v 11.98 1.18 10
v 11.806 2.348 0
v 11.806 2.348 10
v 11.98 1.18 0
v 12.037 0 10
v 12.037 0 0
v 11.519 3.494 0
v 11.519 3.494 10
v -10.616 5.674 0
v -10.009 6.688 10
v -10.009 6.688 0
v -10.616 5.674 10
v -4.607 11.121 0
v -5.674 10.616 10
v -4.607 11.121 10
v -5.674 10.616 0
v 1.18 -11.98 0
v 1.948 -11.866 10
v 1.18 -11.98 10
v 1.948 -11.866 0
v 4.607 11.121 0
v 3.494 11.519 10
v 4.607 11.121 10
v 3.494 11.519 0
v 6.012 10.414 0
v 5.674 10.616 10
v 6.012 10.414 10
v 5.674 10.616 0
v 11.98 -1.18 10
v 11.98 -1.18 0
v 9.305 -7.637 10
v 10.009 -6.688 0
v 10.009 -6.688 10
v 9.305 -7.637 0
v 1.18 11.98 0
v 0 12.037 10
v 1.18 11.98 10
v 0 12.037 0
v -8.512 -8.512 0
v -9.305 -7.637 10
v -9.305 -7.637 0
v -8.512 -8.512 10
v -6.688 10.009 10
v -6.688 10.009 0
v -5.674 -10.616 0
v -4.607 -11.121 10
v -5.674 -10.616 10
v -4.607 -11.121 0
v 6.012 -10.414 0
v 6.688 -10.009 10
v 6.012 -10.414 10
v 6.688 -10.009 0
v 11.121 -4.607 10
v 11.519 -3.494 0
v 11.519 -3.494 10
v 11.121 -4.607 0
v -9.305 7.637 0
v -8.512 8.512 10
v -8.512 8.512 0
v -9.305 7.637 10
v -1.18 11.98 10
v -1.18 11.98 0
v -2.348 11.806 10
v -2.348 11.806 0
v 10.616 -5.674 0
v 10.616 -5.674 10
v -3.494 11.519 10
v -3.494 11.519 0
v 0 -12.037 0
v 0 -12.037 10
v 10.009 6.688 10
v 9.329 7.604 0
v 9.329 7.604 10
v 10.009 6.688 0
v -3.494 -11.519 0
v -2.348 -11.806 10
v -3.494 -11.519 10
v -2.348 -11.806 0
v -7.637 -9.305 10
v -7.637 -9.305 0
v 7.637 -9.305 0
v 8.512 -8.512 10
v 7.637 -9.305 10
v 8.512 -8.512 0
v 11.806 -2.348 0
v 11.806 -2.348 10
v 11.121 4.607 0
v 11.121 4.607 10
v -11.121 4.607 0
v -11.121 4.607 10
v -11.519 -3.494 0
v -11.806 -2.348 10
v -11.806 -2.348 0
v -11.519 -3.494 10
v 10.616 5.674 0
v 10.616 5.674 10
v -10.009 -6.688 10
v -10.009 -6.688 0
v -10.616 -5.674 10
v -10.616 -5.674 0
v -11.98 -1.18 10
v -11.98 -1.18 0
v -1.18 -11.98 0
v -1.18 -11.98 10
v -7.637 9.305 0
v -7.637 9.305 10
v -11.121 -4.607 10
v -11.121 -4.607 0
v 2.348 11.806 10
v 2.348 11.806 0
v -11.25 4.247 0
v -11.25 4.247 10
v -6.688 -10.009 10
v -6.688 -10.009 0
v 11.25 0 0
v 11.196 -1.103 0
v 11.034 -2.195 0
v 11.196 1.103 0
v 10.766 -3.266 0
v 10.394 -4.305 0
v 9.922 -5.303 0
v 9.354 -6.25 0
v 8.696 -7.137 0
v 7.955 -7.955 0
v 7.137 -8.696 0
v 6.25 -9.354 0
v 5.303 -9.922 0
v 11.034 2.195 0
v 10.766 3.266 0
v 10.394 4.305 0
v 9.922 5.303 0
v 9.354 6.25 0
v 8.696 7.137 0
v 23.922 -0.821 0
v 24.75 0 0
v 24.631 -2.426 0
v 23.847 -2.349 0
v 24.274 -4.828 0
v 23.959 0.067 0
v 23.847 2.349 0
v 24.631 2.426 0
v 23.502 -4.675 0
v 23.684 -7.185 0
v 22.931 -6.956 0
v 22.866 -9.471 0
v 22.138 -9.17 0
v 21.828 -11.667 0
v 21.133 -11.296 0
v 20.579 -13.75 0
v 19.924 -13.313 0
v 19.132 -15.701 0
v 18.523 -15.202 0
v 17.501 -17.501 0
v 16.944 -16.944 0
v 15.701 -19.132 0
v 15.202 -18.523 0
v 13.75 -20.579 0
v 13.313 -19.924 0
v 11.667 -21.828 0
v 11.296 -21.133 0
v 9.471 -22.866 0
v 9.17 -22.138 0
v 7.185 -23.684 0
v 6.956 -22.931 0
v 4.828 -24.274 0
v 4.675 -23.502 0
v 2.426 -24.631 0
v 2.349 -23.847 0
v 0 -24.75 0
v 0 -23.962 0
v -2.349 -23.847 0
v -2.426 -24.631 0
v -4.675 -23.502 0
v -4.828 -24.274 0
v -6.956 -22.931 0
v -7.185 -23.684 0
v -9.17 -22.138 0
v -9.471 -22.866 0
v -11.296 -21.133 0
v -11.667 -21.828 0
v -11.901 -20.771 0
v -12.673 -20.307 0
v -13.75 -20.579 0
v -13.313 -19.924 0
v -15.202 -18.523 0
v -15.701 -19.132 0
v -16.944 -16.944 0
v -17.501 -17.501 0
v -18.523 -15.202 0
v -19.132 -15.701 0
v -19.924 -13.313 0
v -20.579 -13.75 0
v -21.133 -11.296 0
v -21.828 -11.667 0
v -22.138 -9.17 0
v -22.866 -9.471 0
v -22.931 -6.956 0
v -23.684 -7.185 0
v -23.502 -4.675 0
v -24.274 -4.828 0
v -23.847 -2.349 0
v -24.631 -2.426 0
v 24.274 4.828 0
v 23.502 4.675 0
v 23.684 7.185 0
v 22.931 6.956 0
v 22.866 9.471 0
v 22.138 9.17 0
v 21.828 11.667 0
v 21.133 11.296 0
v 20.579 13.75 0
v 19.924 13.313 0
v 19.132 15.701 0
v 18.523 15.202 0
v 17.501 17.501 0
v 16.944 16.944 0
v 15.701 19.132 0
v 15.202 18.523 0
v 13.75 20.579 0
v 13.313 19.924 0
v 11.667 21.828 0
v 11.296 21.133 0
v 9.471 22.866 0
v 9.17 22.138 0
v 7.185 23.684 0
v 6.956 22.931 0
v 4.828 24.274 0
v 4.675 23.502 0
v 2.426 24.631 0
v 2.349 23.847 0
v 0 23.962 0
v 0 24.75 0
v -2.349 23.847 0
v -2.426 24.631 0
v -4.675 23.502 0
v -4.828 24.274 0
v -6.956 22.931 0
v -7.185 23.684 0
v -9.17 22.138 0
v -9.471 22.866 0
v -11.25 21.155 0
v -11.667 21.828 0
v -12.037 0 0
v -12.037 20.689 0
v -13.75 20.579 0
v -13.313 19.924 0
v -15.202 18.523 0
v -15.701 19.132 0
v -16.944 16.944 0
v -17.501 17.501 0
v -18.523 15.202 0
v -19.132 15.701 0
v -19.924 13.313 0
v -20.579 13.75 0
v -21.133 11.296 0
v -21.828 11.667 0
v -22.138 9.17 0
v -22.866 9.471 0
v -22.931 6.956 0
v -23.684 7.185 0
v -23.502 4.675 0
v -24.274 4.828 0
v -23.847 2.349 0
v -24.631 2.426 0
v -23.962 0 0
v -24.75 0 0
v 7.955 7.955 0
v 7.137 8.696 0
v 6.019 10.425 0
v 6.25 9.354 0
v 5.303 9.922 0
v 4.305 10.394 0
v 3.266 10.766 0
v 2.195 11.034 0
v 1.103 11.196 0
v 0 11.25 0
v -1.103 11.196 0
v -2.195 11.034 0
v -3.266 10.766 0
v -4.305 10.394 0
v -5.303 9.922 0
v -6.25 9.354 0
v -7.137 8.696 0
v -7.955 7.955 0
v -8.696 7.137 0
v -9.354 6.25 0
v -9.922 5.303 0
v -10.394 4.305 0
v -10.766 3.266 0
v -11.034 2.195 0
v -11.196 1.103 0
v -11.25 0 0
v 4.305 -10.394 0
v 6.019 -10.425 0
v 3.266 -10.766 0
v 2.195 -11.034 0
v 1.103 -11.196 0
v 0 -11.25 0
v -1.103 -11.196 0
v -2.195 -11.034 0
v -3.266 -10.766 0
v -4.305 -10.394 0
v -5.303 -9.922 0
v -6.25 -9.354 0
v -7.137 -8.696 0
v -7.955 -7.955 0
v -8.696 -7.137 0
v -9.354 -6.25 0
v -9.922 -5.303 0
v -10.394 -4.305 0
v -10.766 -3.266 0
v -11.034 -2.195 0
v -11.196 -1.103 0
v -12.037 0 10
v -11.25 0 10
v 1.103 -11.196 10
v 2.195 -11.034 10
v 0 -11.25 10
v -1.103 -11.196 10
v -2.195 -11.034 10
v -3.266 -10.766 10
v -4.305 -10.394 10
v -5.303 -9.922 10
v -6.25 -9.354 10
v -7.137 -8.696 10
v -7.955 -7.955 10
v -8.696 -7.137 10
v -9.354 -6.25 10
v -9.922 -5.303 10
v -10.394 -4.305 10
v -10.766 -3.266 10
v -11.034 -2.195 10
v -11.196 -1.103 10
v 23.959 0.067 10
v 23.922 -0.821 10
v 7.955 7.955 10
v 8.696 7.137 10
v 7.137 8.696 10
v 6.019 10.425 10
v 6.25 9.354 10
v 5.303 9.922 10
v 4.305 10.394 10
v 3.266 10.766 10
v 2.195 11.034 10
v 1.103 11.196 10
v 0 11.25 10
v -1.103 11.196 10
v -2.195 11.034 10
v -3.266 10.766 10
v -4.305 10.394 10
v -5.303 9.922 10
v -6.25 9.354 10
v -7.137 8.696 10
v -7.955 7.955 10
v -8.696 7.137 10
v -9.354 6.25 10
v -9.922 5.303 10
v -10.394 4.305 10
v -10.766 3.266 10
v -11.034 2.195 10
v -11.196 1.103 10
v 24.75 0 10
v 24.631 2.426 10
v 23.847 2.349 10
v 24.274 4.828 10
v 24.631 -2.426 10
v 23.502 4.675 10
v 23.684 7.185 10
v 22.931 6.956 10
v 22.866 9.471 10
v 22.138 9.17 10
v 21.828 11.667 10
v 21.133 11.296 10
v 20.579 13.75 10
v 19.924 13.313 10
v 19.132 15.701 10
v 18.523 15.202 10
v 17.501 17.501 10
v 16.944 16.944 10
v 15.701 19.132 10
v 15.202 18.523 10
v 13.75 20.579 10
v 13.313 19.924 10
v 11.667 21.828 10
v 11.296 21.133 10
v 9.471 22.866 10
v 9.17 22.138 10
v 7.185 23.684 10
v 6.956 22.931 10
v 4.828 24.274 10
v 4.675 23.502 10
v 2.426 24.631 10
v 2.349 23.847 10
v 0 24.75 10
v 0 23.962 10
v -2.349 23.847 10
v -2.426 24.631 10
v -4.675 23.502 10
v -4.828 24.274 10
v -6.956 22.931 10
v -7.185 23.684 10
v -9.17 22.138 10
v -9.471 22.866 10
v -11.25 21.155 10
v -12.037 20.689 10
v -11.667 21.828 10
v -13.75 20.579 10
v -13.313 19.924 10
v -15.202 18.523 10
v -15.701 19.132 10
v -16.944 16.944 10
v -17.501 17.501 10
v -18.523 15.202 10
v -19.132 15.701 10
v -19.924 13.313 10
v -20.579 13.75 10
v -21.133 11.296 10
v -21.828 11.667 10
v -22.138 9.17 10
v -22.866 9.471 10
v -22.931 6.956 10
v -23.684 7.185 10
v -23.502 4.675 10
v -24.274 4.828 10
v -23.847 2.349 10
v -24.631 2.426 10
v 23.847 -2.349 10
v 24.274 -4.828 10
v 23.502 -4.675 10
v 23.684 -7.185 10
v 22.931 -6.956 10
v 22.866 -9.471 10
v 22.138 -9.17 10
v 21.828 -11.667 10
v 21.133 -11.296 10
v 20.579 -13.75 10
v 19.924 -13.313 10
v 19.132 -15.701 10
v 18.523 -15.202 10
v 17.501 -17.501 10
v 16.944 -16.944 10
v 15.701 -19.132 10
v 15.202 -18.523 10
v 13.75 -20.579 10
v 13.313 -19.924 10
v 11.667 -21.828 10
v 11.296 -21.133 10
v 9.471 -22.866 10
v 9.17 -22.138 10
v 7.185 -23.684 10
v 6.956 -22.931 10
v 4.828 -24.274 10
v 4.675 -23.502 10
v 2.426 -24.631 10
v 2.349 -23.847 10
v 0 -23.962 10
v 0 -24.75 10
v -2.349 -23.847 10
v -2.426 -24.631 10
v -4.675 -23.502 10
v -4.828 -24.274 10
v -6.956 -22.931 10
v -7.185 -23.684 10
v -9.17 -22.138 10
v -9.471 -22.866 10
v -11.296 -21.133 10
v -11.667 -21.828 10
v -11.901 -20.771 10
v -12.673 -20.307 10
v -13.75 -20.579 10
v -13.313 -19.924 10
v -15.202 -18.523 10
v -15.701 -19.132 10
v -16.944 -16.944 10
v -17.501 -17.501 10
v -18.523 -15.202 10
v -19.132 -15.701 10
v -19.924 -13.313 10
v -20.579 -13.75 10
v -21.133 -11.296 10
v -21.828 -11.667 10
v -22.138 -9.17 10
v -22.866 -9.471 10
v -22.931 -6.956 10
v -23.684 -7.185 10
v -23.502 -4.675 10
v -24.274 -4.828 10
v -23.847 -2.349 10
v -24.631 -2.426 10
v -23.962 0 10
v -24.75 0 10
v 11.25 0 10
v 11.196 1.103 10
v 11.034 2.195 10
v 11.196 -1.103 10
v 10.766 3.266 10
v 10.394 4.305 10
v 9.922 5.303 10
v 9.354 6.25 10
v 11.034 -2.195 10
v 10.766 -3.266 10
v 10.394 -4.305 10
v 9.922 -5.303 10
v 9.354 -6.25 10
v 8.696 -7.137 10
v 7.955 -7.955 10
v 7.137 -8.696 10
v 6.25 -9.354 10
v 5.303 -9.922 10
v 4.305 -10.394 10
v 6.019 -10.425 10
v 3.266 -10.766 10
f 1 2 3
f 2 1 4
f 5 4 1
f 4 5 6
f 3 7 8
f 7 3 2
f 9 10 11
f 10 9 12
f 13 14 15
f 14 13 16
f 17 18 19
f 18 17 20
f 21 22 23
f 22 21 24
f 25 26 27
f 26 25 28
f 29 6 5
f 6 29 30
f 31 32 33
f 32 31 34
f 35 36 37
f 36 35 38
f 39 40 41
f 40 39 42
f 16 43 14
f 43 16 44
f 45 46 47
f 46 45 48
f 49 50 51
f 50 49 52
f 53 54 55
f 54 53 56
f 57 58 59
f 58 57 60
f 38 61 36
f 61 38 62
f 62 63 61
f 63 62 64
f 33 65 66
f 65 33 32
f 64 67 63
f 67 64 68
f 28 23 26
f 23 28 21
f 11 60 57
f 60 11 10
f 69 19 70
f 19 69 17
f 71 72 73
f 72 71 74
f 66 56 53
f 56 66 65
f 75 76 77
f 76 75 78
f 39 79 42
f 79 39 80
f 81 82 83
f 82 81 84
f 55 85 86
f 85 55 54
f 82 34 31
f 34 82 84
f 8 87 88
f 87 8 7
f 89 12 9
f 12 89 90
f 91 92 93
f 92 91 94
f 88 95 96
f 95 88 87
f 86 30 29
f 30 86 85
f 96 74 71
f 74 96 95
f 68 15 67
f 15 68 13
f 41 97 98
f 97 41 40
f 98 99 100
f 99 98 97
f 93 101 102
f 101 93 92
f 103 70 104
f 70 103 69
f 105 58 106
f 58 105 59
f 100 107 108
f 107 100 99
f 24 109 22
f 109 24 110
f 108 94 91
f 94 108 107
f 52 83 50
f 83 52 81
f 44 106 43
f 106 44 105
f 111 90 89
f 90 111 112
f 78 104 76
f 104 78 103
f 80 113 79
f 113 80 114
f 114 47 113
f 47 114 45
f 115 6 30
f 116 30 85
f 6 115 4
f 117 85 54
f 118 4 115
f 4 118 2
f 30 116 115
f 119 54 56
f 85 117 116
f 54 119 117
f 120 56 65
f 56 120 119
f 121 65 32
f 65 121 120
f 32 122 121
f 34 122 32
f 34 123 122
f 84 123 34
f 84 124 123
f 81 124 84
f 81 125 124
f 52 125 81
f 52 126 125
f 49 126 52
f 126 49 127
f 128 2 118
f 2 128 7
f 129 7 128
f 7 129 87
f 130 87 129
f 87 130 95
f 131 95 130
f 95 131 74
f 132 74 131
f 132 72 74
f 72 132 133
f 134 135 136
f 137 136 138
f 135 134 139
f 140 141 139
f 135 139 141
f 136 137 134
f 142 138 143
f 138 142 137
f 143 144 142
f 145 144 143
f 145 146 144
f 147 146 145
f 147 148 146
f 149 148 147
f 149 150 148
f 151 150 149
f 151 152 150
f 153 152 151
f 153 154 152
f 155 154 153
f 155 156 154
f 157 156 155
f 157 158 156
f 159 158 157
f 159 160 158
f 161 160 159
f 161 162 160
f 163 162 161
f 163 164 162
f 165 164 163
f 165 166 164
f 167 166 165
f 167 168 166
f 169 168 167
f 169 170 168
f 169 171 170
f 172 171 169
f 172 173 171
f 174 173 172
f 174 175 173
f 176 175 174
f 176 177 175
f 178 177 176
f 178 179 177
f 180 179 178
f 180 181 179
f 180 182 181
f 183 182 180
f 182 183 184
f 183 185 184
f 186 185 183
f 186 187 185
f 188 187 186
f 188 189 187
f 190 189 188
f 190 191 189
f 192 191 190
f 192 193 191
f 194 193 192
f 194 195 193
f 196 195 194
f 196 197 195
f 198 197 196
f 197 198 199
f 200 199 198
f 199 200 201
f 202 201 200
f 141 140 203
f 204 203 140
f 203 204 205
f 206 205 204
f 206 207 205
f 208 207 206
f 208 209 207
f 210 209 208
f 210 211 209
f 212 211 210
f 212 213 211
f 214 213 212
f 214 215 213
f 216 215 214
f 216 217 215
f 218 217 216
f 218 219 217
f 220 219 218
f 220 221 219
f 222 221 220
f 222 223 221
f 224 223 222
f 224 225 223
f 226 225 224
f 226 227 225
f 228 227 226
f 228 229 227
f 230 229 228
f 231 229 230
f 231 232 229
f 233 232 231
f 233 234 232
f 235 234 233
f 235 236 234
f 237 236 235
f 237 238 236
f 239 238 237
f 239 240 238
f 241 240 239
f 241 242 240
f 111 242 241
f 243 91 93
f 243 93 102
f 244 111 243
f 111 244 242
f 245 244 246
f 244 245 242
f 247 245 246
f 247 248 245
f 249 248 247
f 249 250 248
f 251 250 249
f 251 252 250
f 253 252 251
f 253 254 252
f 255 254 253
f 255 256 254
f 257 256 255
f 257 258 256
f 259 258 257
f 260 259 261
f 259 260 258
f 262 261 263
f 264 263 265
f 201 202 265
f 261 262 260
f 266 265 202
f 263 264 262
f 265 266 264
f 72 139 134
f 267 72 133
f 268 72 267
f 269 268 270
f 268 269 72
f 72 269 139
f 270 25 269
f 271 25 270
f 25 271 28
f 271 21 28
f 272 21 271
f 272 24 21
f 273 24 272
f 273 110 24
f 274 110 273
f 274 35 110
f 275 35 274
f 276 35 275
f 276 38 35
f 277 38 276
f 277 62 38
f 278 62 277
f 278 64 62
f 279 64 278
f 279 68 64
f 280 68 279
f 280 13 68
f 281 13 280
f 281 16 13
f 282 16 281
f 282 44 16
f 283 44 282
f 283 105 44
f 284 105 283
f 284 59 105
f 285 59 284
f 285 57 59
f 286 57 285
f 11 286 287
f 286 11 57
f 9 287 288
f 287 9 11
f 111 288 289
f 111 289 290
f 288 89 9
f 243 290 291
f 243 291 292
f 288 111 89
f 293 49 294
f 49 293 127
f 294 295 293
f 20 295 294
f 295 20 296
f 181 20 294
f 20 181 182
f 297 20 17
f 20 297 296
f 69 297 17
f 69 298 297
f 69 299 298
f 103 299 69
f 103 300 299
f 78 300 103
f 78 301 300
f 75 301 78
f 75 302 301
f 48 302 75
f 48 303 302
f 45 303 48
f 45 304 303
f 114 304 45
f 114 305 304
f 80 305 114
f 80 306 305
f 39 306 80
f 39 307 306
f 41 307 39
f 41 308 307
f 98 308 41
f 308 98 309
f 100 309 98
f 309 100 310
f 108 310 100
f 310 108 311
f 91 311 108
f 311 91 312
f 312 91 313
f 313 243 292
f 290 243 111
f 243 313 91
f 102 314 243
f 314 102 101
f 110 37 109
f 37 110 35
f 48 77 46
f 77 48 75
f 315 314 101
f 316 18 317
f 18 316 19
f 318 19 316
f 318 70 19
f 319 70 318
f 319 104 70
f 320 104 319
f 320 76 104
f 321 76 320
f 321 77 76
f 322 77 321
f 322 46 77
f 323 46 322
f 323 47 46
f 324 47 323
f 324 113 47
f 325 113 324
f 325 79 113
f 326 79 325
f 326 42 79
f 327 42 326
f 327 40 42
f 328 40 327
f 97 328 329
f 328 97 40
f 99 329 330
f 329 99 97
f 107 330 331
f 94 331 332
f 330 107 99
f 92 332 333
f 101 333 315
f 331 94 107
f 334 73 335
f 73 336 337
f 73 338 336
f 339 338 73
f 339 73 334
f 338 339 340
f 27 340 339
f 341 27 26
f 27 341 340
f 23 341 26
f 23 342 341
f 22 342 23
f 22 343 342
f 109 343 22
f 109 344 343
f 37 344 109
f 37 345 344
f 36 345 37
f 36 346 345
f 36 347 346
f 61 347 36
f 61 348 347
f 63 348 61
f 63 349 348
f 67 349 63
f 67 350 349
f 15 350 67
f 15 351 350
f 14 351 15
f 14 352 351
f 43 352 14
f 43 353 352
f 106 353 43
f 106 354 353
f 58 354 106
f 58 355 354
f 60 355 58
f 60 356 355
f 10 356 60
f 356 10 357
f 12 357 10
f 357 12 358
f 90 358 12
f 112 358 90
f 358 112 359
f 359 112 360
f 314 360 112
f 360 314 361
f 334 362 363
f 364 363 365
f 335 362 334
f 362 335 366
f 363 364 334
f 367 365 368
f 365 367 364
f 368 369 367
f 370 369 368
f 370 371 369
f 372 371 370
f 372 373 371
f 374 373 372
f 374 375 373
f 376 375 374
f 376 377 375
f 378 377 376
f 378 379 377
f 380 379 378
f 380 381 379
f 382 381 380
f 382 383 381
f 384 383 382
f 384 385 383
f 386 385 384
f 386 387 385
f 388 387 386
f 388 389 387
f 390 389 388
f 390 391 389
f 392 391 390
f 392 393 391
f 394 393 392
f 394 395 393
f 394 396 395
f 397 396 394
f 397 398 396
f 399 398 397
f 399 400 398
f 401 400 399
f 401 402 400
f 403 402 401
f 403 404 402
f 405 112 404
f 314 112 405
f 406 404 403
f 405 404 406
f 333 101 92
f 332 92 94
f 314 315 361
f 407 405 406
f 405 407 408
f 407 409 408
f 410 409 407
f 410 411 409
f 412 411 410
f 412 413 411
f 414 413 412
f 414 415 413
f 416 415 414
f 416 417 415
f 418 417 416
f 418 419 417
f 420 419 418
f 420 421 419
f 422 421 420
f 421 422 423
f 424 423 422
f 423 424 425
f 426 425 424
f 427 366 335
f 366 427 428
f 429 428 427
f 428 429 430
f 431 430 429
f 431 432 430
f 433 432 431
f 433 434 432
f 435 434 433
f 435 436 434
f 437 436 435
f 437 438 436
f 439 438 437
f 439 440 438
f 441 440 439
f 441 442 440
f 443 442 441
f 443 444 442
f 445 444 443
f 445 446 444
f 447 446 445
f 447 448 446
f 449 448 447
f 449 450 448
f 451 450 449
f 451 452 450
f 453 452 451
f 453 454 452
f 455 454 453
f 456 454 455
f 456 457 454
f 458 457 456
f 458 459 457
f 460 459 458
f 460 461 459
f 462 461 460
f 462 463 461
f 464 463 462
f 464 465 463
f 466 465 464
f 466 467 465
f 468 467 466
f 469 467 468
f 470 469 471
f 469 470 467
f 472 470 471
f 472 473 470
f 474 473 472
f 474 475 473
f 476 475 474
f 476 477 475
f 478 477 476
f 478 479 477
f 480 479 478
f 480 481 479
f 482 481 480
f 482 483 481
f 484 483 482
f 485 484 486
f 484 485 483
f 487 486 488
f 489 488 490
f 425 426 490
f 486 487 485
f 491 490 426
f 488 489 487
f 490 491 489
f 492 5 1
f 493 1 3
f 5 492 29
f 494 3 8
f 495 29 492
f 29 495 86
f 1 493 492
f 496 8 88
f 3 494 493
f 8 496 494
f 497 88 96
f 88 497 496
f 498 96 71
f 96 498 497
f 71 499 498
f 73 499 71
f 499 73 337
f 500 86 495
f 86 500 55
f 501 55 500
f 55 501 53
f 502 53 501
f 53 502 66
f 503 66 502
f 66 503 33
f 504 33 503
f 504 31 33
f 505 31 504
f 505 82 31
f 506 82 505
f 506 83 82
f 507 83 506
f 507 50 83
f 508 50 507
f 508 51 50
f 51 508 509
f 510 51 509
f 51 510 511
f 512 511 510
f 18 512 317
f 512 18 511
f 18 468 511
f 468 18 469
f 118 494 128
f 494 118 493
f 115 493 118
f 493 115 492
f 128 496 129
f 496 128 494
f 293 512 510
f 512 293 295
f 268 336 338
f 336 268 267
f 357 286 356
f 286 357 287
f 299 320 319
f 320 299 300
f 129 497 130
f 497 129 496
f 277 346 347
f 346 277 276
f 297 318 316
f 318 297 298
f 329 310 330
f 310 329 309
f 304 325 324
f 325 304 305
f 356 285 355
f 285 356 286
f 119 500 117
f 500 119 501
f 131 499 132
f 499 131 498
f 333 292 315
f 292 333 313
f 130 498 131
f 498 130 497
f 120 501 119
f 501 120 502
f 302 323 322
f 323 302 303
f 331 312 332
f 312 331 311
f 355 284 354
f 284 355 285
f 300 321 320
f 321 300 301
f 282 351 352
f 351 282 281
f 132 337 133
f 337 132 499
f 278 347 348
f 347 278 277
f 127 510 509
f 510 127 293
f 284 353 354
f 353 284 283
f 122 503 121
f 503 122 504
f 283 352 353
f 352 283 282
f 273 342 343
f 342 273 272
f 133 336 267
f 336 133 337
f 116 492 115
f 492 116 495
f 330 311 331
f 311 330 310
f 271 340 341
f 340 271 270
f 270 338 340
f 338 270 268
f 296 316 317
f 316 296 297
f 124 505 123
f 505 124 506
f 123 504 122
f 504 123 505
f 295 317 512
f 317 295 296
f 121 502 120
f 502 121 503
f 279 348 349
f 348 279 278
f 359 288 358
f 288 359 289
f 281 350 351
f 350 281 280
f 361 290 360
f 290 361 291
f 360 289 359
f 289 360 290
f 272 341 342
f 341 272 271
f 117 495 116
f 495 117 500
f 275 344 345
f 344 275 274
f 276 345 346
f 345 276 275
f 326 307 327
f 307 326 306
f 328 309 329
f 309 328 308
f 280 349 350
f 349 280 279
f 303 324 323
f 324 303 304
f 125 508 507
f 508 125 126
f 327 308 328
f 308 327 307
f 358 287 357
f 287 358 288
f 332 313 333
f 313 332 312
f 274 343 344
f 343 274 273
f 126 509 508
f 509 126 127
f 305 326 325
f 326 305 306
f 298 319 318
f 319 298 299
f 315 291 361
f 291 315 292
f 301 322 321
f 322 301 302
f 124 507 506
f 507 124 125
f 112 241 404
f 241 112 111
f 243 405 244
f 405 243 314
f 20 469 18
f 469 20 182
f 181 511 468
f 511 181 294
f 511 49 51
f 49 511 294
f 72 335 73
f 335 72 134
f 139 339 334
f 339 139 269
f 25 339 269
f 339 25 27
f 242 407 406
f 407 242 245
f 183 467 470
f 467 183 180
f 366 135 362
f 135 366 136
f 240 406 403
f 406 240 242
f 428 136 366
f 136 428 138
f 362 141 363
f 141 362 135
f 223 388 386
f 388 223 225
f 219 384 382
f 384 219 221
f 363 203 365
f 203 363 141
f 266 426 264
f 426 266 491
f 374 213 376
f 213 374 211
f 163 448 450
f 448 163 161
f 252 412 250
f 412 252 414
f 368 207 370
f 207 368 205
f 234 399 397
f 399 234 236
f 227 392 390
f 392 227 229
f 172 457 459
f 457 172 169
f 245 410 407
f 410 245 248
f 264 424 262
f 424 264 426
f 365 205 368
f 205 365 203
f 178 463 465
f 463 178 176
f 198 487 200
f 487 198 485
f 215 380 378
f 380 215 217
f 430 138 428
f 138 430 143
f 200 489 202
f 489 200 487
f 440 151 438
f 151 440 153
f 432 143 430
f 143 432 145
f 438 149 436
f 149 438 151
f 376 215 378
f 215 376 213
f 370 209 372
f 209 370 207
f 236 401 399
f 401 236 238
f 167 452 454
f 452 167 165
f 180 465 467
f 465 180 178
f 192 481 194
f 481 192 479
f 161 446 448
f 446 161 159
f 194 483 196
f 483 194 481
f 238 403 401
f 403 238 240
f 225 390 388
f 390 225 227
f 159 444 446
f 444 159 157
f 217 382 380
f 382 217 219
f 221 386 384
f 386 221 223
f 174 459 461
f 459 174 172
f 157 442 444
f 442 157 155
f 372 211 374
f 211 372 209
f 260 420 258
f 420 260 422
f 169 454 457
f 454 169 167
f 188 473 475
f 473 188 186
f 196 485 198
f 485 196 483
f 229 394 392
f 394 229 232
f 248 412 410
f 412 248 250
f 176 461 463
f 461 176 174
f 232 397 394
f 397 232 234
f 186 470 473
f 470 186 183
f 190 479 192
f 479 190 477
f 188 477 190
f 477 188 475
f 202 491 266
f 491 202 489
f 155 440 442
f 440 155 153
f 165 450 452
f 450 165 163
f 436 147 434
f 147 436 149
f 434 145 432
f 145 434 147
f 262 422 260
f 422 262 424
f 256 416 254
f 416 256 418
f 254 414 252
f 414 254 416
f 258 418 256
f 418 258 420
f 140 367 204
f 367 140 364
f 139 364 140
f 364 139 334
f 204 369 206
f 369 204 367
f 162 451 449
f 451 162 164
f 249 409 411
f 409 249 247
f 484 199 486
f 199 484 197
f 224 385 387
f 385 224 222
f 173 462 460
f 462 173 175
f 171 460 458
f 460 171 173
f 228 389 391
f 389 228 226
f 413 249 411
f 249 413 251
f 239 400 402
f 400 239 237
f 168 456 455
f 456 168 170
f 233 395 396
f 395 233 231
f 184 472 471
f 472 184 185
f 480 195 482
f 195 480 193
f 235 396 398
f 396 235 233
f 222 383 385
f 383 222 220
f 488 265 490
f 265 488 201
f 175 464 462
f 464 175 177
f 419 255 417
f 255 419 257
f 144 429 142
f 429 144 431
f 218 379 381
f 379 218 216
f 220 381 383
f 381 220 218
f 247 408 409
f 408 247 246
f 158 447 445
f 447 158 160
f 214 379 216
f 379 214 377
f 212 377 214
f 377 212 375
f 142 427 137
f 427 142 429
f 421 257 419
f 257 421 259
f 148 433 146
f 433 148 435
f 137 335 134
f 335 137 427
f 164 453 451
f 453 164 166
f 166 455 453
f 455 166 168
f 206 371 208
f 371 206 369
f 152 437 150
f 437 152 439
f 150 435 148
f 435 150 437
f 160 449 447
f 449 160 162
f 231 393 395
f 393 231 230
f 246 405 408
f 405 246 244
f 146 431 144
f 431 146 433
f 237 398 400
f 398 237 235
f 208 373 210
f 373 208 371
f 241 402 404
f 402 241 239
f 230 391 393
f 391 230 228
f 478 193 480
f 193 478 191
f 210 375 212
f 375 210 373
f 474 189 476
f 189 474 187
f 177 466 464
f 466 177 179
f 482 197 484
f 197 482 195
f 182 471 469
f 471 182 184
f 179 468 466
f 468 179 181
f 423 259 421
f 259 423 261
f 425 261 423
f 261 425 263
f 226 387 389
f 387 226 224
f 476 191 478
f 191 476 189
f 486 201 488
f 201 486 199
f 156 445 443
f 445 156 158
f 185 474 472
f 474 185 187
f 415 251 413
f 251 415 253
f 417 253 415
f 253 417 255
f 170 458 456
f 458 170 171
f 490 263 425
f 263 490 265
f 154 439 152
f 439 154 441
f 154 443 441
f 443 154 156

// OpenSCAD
//Guard Section
//Inner Diameter
ID = 22.5; 
//Outer Diameter
OD = ID+27; 
//Height
H = 10; 

//Inner Diameter ring
EN = 1; // [1:enable, 0:disable]

//Spring Section
//Spring Angle
Angle = 0;
//Spring Count

Count = 3;

/*
Take these from slic3r's setting based on the same parameter name there and put them here.
Or you can totally punch in direct number on WD if you know the number especially from slic3r's recommendation.
*/
overlap_ratio = 0.25;
extrusion_width = 0.45;
WD = extrusion_width * 2 - extrusion_width * overlap_ratio; ; 
echo("wall_width: ",WD);


$fn = 64;

module InnerRing(){
difference(){
    color("green")cylinder(h = H, d = ID+(WD*2));
    color("maroon")cylinder(h = 12, d = ID);
    }
}

//translate([-(ID/2),0,0])rotate([0,0,Angle])cube([WD, OD*0.75, H]);

module OuterRing(){
    difference(){
color("green")cylinder(h = H, d = OD);
color("maroon",0.5)cylinder(h = 12, d = OD-(WD*2));
    }
}

module Spring(){
    intersection(){
        for(i=[0:Count]){
            rotate([0,0,i*360/Count])
        translate([-(ID/2+WD),0,0])rotate([0,0,Angle])cube([WD, OD*0.75, H]);
        }
        color("maroon",0.5)cylinder(h = 12, d = OD);
    }
}

union(){
    if(EN==1){
        InnerRing();
        Spring();
        OuterRing();
    }
    else
    {
        Spring();
        OuterRing();
    }
}
